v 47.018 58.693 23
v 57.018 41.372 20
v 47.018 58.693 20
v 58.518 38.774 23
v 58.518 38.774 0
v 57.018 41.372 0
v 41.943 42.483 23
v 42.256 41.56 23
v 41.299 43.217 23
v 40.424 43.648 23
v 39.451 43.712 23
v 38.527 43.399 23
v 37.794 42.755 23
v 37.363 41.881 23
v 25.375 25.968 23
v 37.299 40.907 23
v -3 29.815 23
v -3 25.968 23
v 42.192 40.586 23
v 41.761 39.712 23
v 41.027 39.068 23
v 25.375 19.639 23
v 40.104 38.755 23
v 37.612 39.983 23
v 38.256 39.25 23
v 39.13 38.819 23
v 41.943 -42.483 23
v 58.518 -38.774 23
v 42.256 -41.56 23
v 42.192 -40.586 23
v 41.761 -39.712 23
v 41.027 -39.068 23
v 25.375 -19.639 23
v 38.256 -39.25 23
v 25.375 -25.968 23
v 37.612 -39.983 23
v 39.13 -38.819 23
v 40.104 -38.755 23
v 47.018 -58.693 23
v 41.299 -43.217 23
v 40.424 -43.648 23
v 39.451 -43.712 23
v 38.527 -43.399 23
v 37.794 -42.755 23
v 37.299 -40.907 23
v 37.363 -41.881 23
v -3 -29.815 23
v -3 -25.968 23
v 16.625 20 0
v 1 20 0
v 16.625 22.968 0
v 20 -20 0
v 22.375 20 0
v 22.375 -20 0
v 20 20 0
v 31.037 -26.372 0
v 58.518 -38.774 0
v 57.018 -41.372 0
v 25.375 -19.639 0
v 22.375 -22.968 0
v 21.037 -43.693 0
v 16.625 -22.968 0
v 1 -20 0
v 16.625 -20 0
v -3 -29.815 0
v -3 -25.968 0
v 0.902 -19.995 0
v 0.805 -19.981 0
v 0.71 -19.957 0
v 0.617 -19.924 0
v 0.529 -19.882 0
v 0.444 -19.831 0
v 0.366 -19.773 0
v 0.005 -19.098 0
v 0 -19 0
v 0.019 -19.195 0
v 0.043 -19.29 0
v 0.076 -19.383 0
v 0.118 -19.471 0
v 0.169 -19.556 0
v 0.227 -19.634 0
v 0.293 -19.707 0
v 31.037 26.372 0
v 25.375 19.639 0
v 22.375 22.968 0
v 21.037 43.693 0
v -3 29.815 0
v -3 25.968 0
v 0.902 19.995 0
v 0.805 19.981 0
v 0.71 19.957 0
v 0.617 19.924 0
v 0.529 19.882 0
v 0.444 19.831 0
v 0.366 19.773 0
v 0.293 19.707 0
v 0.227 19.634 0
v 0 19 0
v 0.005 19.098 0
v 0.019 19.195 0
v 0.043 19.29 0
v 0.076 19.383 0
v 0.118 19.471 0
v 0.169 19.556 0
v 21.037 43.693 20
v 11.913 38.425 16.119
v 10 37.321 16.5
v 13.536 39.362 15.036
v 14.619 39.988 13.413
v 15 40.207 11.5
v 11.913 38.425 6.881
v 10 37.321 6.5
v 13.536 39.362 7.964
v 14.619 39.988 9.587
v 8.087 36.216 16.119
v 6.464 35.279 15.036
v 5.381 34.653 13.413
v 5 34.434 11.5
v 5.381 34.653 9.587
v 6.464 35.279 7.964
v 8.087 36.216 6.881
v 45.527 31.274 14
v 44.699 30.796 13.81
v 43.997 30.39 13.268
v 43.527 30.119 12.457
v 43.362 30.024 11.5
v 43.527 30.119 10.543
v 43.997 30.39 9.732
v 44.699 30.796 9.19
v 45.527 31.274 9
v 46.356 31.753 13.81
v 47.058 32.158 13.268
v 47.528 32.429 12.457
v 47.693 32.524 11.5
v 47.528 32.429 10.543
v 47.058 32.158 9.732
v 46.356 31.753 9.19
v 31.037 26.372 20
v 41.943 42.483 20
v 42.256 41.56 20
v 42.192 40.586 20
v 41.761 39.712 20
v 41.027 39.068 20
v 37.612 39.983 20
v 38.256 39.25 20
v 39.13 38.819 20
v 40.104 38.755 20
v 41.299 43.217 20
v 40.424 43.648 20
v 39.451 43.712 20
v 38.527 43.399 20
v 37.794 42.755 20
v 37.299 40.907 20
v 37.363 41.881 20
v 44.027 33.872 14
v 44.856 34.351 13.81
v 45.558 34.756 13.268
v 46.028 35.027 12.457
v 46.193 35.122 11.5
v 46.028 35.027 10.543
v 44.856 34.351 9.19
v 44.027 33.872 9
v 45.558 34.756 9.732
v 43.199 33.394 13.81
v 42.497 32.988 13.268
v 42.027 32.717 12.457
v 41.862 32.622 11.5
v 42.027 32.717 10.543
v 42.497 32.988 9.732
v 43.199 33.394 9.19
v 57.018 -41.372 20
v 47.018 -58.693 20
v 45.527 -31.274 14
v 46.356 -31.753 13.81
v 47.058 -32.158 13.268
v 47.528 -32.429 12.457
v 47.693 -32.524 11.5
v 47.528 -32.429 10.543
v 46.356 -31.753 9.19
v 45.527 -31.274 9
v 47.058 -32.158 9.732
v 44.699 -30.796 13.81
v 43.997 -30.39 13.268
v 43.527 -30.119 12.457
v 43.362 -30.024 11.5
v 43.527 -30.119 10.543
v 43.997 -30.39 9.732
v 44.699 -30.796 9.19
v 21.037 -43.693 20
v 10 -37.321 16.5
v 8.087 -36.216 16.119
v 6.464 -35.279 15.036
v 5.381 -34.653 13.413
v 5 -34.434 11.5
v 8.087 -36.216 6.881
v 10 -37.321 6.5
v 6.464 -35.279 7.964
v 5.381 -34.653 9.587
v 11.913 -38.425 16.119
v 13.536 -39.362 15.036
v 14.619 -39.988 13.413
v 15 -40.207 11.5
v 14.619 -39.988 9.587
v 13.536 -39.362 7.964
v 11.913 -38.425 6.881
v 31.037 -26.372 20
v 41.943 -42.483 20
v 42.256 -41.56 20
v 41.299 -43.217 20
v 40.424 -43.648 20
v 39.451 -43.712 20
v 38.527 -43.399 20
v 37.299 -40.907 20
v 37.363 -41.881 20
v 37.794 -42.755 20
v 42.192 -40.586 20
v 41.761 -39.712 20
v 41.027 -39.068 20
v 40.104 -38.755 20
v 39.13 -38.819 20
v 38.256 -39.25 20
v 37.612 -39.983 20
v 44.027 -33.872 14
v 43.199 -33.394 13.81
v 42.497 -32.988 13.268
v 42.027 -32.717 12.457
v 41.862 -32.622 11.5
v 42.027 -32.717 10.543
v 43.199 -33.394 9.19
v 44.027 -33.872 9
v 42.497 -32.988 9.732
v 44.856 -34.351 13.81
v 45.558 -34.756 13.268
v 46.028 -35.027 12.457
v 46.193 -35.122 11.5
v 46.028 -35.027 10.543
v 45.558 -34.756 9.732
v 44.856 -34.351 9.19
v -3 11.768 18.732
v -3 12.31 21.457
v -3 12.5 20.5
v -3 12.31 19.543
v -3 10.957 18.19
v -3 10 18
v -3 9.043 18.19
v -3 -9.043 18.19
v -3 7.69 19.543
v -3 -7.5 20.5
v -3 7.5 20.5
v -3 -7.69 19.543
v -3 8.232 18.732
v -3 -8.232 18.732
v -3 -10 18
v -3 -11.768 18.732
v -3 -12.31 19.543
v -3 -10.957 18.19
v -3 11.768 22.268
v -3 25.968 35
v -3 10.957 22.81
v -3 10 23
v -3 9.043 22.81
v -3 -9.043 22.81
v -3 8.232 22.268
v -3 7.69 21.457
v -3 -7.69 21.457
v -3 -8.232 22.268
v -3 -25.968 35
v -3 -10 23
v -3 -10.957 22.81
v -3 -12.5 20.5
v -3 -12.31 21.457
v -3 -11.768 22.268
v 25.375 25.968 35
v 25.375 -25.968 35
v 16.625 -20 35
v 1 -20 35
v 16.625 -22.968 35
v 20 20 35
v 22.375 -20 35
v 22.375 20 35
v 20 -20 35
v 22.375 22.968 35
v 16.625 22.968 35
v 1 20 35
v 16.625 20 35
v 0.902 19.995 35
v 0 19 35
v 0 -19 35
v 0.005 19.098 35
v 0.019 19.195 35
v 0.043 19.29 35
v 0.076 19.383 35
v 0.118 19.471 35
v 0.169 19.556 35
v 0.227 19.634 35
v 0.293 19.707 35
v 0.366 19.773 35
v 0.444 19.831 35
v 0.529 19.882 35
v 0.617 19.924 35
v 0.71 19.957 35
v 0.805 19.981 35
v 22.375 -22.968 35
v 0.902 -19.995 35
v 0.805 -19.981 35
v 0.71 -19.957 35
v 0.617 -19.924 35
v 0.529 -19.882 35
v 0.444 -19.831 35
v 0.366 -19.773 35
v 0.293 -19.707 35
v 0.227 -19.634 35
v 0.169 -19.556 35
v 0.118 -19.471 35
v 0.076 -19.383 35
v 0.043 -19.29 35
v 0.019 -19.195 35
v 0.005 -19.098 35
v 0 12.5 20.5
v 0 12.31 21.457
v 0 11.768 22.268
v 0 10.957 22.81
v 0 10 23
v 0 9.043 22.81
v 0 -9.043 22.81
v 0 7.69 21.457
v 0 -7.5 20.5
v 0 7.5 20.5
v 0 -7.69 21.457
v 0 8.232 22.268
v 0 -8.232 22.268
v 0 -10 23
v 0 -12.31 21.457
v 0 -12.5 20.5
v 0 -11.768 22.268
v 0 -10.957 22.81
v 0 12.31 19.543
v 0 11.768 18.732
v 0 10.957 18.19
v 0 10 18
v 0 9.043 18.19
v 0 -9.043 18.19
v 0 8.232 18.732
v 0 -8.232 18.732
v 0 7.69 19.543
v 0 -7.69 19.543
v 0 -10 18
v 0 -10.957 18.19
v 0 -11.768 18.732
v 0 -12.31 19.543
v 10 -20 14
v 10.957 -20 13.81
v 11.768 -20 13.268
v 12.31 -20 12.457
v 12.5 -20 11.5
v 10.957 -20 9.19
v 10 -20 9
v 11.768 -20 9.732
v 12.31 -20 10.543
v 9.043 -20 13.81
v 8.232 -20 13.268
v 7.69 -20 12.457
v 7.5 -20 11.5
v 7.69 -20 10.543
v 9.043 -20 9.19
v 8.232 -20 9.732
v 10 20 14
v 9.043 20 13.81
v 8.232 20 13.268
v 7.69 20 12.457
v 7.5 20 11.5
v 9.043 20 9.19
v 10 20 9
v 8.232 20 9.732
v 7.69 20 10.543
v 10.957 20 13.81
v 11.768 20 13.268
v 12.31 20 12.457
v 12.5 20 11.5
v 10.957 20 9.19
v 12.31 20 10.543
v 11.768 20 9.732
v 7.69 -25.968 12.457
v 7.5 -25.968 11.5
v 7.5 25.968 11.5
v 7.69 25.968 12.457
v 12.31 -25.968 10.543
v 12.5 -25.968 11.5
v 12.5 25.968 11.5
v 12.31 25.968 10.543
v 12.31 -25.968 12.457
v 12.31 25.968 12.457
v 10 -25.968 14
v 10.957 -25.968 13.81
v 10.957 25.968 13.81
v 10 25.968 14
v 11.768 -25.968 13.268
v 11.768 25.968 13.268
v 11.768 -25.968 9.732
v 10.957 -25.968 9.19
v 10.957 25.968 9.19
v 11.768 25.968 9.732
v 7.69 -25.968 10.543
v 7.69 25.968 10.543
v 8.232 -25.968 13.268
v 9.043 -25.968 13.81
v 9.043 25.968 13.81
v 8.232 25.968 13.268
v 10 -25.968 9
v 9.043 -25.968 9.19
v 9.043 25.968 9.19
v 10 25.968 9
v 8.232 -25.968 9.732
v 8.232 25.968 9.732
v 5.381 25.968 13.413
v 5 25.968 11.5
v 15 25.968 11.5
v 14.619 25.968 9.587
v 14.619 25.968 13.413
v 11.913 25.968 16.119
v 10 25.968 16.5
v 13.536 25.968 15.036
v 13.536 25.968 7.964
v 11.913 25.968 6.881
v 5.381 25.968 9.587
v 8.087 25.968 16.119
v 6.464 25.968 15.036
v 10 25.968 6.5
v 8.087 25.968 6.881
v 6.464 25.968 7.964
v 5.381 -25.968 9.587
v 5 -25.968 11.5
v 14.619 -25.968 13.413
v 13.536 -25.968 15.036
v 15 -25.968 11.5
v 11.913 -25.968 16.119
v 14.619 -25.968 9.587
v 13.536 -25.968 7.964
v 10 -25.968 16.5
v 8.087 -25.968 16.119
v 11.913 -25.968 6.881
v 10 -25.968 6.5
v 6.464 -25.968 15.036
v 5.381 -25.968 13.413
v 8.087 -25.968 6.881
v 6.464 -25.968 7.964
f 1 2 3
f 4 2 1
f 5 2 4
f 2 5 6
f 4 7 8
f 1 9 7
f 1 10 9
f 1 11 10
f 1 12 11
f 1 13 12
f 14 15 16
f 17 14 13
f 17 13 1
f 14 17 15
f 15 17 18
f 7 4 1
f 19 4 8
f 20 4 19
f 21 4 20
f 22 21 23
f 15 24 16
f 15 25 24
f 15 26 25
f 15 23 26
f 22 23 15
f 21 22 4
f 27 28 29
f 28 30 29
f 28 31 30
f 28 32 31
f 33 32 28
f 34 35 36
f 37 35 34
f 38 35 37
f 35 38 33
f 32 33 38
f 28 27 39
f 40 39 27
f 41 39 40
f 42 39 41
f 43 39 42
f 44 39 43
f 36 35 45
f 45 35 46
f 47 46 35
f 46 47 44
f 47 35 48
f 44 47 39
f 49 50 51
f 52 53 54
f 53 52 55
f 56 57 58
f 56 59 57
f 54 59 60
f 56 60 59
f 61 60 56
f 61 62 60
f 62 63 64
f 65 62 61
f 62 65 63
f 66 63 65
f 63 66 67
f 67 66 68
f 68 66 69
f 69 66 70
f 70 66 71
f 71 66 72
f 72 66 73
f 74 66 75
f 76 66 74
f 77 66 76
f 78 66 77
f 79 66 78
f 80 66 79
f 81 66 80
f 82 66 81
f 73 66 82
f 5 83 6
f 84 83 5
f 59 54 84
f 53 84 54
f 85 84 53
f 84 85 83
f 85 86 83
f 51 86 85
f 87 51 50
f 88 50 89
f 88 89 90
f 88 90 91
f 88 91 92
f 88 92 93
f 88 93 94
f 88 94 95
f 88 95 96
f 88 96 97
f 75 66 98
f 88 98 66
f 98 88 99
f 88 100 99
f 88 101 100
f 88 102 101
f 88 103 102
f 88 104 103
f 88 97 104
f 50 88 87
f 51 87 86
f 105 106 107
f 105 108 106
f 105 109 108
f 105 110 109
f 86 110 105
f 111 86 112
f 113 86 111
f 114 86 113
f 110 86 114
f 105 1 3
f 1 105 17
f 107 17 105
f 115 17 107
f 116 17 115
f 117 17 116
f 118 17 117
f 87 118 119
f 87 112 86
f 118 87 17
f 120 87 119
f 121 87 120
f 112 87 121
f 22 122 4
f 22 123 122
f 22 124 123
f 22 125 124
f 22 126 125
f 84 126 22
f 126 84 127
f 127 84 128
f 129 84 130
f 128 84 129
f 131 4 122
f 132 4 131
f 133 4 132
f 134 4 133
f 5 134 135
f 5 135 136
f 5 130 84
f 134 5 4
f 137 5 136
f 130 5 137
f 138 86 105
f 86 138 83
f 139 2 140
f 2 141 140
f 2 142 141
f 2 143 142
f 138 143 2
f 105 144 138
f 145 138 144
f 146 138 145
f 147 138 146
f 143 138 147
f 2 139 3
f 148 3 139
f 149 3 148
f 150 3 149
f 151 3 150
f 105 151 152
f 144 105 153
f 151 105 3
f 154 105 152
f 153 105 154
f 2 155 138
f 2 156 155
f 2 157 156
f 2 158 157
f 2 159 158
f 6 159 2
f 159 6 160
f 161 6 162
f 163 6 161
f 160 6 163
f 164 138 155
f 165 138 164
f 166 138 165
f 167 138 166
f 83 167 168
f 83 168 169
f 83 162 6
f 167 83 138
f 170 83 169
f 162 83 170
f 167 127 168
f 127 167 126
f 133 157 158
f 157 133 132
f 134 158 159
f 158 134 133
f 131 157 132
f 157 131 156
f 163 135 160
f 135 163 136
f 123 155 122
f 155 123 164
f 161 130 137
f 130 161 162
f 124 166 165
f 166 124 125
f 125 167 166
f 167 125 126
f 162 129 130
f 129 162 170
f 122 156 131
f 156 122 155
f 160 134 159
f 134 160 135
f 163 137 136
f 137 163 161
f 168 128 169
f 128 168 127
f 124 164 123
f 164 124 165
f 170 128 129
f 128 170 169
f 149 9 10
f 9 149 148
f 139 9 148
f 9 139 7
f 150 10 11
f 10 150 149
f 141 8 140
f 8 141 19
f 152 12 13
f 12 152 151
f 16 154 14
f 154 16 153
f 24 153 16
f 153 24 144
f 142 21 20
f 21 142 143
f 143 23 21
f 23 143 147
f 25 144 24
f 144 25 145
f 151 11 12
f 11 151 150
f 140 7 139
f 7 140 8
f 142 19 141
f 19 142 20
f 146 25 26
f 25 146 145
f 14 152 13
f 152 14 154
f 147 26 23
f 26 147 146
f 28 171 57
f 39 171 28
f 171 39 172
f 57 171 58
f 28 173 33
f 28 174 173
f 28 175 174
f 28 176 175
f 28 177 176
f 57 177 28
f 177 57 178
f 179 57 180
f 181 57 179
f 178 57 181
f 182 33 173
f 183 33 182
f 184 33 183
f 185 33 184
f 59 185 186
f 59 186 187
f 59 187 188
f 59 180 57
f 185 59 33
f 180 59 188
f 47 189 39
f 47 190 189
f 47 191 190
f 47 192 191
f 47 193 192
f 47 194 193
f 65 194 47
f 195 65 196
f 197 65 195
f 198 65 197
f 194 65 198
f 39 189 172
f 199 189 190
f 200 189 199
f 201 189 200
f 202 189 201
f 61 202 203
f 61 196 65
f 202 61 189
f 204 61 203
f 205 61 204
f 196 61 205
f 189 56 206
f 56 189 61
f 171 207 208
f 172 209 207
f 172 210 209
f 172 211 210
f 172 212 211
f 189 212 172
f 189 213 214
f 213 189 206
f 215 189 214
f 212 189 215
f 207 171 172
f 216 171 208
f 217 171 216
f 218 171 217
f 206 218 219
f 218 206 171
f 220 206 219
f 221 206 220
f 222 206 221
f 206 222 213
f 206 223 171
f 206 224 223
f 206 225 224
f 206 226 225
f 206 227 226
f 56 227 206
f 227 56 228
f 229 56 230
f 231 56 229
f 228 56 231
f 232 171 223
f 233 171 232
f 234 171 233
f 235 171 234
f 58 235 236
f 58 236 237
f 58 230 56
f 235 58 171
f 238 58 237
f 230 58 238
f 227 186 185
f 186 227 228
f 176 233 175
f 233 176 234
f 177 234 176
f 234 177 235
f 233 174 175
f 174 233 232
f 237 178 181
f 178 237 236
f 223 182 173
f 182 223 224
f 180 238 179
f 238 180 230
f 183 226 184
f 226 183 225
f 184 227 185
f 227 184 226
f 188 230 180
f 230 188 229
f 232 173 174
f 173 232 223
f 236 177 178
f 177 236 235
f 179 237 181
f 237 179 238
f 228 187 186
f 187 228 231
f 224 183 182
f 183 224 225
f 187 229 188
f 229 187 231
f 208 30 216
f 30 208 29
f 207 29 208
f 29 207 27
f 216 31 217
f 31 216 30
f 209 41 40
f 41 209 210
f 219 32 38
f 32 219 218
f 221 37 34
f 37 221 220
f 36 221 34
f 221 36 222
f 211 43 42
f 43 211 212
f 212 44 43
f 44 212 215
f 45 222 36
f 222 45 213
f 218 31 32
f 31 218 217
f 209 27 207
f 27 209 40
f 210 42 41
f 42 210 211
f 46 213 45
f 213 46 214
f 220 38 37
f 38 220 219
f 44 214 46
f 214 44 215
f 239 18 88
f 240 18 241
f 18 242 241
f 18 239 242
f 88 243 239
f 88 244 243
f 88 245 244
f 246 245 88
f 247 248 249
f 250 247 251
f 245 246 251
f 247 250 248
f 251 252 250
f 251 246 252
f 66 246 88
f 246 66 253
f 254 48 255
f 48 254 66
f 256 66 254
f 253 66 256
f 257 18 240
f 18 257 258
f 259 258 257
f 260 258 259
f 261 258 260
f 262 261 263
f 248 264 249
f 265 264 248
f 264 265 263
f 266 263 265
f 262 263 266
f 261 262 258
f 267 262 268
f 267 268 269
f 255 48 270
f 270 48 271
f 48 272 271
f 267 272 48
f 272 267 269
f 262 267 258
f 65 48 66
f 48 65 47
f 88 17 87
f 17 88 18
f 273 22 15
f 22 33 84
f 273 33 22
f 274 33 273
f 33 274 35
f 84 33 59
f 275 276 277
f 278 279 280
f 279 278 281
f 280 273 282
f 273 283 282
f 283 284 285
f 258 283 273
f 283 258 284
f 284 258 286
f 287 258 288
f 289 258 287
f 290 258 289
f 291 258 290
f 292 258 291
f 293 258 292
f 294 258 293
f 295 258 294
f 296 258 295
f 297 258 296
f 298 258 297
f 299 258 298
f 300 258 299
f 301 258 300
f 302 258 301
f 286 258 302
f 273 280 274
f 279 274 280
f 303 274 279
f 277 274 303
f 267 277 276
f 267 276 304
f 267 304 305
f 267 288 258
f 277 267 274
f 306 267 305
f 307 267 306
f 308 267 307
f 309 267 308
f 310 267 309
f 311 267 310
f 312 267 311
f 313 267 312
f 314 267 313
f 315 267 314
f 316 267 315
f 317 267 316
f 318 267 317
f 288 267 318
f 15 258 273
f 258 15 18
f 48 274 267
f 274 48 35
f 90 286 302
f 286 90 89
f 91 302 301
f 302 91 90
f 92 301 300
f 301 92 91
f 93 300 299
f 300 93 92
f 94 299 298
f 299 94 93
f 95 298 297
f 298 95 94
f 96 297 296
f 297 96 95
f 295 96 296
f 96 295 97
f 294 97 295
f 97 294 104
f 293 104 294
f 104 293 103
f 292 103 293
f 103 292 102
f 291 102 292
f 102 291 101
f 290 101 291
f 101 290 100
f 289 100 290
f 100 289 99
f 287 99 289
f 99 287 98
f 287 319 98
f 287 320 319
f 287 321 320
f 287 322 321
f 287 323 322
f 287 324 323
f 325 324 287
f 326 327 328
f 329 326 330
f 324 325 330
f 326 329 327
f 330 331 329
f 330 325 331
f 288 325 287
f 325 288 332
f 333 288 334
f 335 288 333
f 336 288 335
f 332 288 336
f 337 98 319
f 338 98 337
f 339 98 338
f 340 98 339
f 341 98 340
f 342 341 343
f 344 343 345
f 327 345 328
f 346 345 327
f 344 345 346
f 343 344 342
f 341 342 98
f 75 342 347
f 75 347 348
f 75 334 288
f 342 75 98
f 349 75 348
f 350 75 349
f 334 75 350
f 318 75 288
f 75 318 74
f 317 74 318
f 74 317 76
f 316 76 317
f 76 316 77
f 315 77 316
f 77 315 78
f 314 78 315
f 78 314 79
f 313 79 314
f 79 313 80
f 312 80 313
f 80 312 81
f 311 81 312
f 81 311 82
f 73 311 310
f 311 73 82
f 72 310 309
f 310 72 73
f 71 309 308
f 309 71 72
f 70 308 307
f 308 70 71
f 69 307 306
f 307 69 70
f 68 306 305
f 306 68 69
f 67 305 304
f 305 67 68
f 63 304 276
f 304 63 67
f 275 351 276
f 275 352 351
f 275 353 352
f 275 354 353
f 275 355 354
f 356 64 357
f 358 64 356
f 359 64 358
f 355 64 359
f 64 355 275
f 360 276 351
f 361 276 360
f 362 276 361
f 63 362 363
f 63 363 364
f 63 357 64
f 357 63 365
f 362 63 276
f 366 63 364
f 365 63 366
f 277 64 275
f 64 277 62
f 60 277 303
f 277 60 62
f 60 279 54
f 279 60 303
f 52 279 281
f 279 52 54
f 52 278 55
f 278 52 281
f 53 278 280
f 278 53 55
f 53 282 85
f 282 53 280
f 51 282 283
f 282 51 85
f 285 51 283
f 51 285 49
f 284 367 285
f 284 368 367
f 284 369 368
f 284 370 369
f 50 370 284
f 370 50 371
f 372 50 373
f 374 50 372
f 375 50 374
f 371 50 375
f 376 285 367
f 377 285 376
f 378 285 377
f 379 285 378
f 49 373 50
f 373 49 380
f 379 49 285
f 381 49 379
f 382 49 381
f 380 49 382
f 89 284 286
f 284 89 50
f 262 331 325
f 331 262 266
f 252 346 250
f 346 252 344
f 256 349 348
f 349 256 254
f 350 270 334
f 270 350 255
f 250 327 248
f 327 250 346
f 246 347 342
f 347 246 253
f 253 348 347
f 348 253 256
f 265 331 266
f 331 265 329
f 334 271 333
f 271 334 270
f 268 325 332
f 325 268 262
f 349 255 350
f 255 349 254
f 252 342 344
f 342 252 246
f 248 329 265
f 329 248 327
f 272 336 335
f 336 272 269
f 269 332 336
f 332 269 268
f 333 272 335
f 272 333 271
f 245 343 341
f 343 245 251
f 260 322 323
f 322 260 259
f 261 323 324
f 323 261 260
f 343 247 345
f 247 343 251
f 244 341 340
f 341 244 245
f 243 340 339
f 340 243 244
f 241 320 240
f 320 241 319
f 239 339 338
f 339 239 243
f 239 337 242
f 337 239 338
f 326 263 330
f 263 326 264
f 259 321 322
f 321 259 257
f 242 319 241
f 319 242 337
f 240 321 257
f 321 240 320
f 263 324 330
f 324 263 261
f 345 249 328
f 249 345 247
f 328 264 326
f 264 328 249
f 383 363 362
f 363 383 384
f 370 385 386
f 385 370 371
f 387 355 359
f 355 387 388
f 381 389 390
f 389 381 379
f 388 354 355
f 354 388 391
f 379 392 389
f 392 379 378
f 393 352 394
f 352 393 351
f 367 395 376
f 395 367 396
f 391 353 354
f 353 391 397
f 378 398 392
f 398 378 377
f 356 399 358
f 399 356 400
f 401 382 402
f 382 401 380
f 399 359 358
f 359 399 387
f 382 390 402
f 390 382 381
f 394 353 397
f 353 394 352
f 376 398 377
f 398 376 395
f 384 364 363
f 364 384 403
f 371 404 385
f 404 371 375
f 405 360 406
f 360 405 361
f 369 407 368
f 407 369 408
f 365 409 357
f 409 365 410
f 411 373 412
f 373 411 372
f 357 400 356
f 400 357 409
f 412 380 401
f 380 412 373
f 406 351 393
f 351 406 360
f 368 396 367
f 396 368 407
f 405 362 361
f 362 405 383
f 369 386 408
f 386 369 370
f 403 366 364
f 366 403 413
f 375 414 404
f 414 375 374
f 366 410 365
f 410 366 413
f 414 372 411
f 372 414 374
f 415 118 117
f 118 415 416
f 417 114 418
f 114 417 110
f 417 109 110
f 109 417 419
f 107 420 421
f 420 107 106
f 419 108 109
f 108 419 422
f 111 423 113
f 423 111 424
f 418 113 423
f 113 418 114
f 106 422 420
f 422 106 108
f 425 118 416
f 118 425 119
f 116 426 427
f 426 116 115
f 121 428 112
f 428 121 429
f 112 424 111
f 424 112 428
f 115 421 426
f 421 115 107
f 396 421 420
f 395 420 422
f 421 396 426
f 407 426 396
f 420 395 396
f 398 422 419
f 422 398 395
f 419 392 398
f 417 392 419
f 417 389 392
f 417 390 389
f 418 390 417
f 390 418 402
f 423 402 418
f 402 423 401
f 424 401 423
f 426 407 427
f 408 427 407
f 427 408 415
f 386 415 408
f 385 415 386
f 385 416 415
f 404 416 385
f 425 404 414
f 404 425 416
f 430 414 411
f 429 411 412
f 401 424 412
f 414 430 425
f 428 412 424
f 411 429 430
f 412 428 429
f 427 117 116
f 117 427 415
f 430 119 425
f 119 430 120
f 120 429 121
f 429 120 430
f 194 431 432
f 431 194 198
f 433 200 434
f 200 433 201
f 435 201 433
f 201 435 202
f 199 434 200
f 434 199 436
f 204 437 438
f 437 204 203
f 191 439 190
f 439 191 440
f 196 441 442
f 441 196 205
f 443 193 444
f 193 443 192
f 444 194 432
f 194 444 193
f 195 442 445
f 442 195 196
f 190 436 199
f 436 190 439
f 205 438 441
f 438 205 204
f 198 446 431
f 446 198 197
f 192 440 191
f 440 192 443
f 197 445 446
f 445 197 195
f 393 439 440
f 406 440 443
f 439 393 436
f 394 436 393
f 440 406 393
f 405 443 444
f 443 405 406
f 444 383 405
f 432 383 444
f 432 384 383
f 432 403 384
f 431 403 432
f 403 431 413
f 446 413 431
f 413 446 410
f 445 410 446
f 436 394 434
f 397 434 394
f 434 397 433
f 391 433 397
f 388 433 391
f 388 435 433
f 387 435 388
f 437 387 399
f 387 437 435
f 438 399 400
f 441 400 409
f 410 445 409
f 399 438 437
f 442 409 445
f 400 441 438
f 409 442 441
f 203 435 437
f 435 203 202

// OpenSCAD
// file: ../../conf/printer_config.scad
/**********************************************************************************************************************
 **
 ** conf/printer_config.scad
 **
 ** This file contains the main control variables that determine the size and shape of the printer. Note that in the
 ** actual parts specifications, the constants defined here will only ever be accessed through functions defined in
 ** conf/derived_sizes.scad exclusively to allow for easier adaptation, should the mode of calculation change. 
 **
 ** All sizes in mm. Caution: Little to no cross-checking is implemented. Change values sensibly and one at a time.
 **
 ** This file is NOT to be included by any other file except for conf/derived_sizes.scad.
 **
 **********************************************************************************************************************/

// ===== PRINTER CONFIGURATION ========================================================================================

// The length of the vertical MakerSlide extrusions that make up the rails for the carriages.
FRAME_V_RAIL_HEIGHT = 800;

// The length of the horizontal 20x20 V-Slot extrusions that form the sides of the triangle.
FRAME_H_RAIL_LENGTH = 400;

// ===== FABRICATED PART DIMENSIONS ===================================================================================

// The thickness of the walls outside the extruded parts.
FRAME_PART_WALL_THICKNESS = 3;

// The thickness of the wall that separates the vertical rails from the horizontal extrusions.
FRAME_V_H_RAIL_SEPARATION = 8;

// The depth of the holes that hold the V-Slot extrusions.
FRAME_PART_VSLOT_DEPTH = 30;

// The depth of the holes that hold the MakerSlide extrusions.
FRAME_PART_HSLOT_DEPTH = 35;

// The height of the bracket that holds the motor. WARNING: Increasing this might make it difficult to 
// turn the screws that hold the motor.
FRAME_PART_BRACKET_HEIGHT = 25;

// // ===== SCREWS, NUTS, BOLTS AND OTHER HARDWARE =======================================================================

// The diameter of the screws used to assemble the frame.
FRAME_SCREW_SIZE = 5;

// The diameter of the head of the screws used to assemble the frame. Actually, this is the size of the inset flange.
// The screw head of a M5 hex screw is 8.5 mm in diameter, so 10 mm should leave enough clearance.
FRAME_SCREW_HEAD_SIZE = 10;
// file: ../extrusions/vslot_2020.scad
/**********************************************************************************************************************
 **
 ** parts/extrusions/vslot_2020.scad
 **
 ** This file ontains some general functions that provide the dimensions of the profile as well as the modules used 
 ** to import the rendered rails. 
 ** This file is intended to be included by other files down the line.
 **
 **********************************************************************************************************************/

use <../../bom/bom.scad>
use <../../conf/colors.scad>
use <../../conf/derived_sizes.scad>
use <../../conf/part_sizes.scad>

/**
 * Provides the pre-rendered horizontal side piece.
 * The extrusion will lie horizontally along the positive X axis and will extend into positve Y and Z.
 */
module vslot_2020_side() {
	bom_entry(description = "V-Slot Extrusion", size = str(horizontal_extrusion_length(), "x20x20 mm"));
	color_extrusion()
		import(file = "vslot_2020_side.stl"); 
}

/**
 * Create an object that resembles the outer shell of a V-Slot 20x20 mm extrusion. Usage is similar
 * to vslot_extrusion(length). This is handy to punch a hole into a printed part that will later
 * accomodate the V-Slot 20x20 mm extrusion.
 */
module vslot_2020_punch(length, rounded = false) {
	color_punch()
		linear_extrude(height = length, center = false, convexity = 10)
			if (rounded) {
				hull($fn = vslot_2020_edge_resolution()) {
					translate([vslot_2020_edge_radius(), vslot_2020_edge_radius(), 0])
						circle(r = vslot_2020_edge_radius());
					translate([vslot_2020_depth() - vslot_2020_edge_radius(), vslot_2020_edge_radius(), 0])
						circle(r = vslot_2020_edge_radius());
					translate([vslot_2020_edge_radius(), 18.5, 0])
						circle(r = vslot_2020_edge_radius());
					translate([vslot_2020_depth() - vslot_2020_edge_radius(), vslot_2020_width() - vslot_2020_edge_radius(), 0])
						circle(r = vslot_2020_edge_radius());
				}
			} else {
				square([vslot_2020_depth(), vslot_2020_width()]);
			}
}
// file: ../extrusions/makerslide.scad
/**********************************************************************************************************************
 **
 ** parts/extrusions/makerslide.scad
 **
 ** This file ontains some general functions that provide the dimensions of the profile as well as the modules used 
 ** to import the rendered rails. 
 ** This file is intended to be included by other files down the line.
 **
 **********************************************************************************************************************/

use <../../bom/bom.scad>
use <../../conf/colors.scad>
use <../../conf/derived_sizes.scad>
use <../../conf/part_sizes.scad>

/**
 * Provides the pre-rendered main vertical rail.
 * The extrusion will reach into positive X and Z space while being centered on the Y axis.
 */
module makerslide_vertical_rail() {
	bom_entry(description = "MakerSlide Extrusion", size = str(vertical_extrusion_length(), " mm"));
	color_extrusion()
		import(file = "makerslide_rail.stl"); 
}

/**
 * Create an object that resembles the outer shell of a MakerSlide extrusion. Usage is similar
 * to makerslide_vertical_rail(length). This is handy to punch a hole into a printed part that will later
 * accomodate the MakerSlide extrusion.
 */
module makerslide_punch(length) {
	color_punch()
		linear_extrude(height = length, center = false, convexity = 10)
			union() {
				hull() {
					// use two circles for the back sides
					_y_offset = makerslide_base_width()/2 - makerslide_edge_radius();
					translate([makerslide_edge_radius(), -_y_offset, 0])
						circle(r = makerslide_edge_radius(), $fn = makerslide_edge_resolution());
					translate([makerslide_edge_radius(), _y_offset, 0])
						circle(r = makerslide_edge_radius(), $fn = makerslide_edge_resolution());
					// use a rectangle to shape the front side
					translate([makerslide_base_depth() - 1, -makerslide_base_width()/2, 0])
						square([1, makerslide_base_width()]);
				}
				_rail_base_x = makerslide_base_depth() - makerslide_edge_radius() - makerslide_rail_depth();
				_rail_offset_y = makerslide_base_width()/2;
				_rail_punch_width = makerslide_rail_width();
				_rail_punch_depth = 2*makerslide_rail_depth() + makerslide_edge_radius();
				translate([_rail_base_x, -_rail_offset_y - _rail_punch_width, 0])
					square([_rail_punch_depth, _rail_punch_width]);
				translate([_rail_base_x, _rail_offset_y, 0])
					square([_rail_punch_depth, _rail_punch_width]);

				// previous version:
				// // use the profile itself as the basic shape
				// import(file = "makerslide.dxf"); 
				// // add a rectangle to fill the holes on the left/right (small) sides 
				// // as well as most of the inside of the profile
				// translate([2, -20, 0])
				// 	square([18, 40]);
				// // add a second rectangle to fill the gaps on the back (we want to keep the rounded edges)
				// translate([0, -18, 0])
				// 	square([2, 36]);
				
			}
}
// file: ../../conf/part_sizes.scad
/**********************************************************************************************************************
 **
 ** conf/part_sizes.scad
 **
 ** This file contains functions that provide fixed sizes of external standard parts. Normally, these values
 ** would have been kept with the individual parts, but that would result in a recursive dependency.
 **
 **********************************************************************************************************************/

// ----- parts/extrusions/vslot_2020.scad ------------------------------------------------------------------------------

// The dimensions were taken from the file vslot_2020_dimensions.jpg.

/**
 * Return the depth (X size) and width (Y size) of the V-Slot extrusion.
 */
function vslot_2020_depth() = 20;
function vslot_2020_width() = 20;

/**
 * The edge radius of the back side and the resolution used to render the curve.
 */
function vslot_2020_edge_radius() = 1.5;
function vslot_2020_edge_resolution() = 64;

/**
 * Return the offset of the screw/nut slots from the back edges or the center.
 */
function vslot_2020_slot_offset() = 10;

// ----- parts/extrusions/makerslide.scad ------------------------------------------------------------------------------

// All dimensions were taken from the file makerslide_b17022_rev_2.pdf.

/**
 * Return the depth (X size) and width (Y size) of the base of the MakerSlide extrusion. These measurements exclude the 
 * rail extensions on the front side, i. e. only comprise the rectangular main body.
 */
function makerslide_base_depth() = 20;
function makerslide_base_width() = 40;

/**
 * Return the additional depth (X size) and width (Y size) introduced by the rail extensions. Note that the width
 * specified here comprises a single rail only.
 */
function makerslide_rail_depth() = 4.75/2;
function makerslide_rail_width() = 5.9358/2;

/**
 * Return the depth (X size) and width (Y size) of the MakerSlide extrusion. These measurements comprise the 
 * rail extensions on the front side.
 */
function makerslide_depth() = makerslide_base_depth() + makerslide_rail_depth();
function makerslide_width() = makerslide_base_width() + 2*makerslide_rail_width();

/**
 * The distance from the "back center" (the origin) of the MakerSlide vertical rails to the outer edges of the rail.
 * Measured value from the DXF drawings: 30.52933453 mm.
 * Calculated size: 32.065 mm
 * The difference is probably due to a rounded edge in the drawing.
 */
function makerslide_rail_edge_distance() = sqrt(pow(makerslide_width() / 2, 2) + pow(makerslide_depth(), 2));

/**
 * The edge radius of the back side and the resolution used to render the curve.
 */
function makerslide_edge_radius() = 1;
function makerslide_edge_resolution() = 64;

/**
 * Return the offset of the screw/nut slots from the back edges or the center.
 */
function makerslide_slot_offset() = 10;
// file: ../../conf/derived_sizes.scad
/**********************************************************************************************************************
 **
 ** conf/derived_sizes.scad
 **
 ** This file contains functions that calculate various dimensions of the printer. Note that sizes that are only 
 ** relevant for specific parts are calculated in the corresponding part files directly.
 **
 **********************************************************************************************************************/

include <printer_config.scad>
use <part_sizes.scad>

// ===== PRINTER FRAME SIZES ===========================================================================================

/**
 * The length of the vertical MakerSlide extrusions.
 */
function vertical_extrusion_length() = FRAME_V_RAIL_HEIGHT;

/**
 * The length of the horizontal 20x20 V-Slot extrusions.
 */
function horizontal_extrusion_length() = FRAME_H_RAIL_LENGTH;

/**
 * The offset of the horizontal V-Slot extrusions from the logical crossing point of the sides of the center triangle
 * (that is, from the center of the outer side of the MakerSlide rail).
 */
function horizontal_extrusion_offset() = makerslide_rail_edge_distance() + horizontal_vertical_extrusion_gap();

/**
 * The overall size of the base triangle - from one crossing point to the next.
 */
function horizontal_base_length() = horizontal_extrusion_length() + 2 * horizontal_extrusion_offset();

// ===== FABRICATED PART DIMENSIONS ===================================================================================

/**
 * The thickness of the wall that separates the vertical rails from the horizontal extrusions.
 */
function horizontal_vertical_extrusion_gap() = FRAME_V_H_RAIL_SEPARATION;

/**
 * The overall thickness of the walls adjacent to the metal extrusions.
 */
function frame_wall_thickness() = FRAME_PART_WALL_THICKNESS;

/**
 * The depth of the holes that hold the V-Slot extrusions.
 */
function horizontal_recess_depth() = FRAME_PART_VSLOT_DEPTH;

/**
 * The distance from the outer perimeter of the screw holes that hold the V-Slot extrusions.
 */
function horizontal_screw_distance() = FRAME_PART_VSLOT_DEPTH/2;

/**
 * The depth of the holes that hold the V-Slot extrusions.
 */
function vertical_recess_depth() = FRAME_PART_HSLOT_DEPTH;

/**
 * The height of the bracket that holds the motor (only of the part that holds the rail).
 */
function motor_bracket_height() = FRAME_PART_BRACKET_HEIGHT;

// ===== SCREWS, NUTS, BOLTS AND OTHER HARDWARE =======================================================================

/**
 * The diameter of the screws used to assemble the frame.
 */
function frame_screw_size() = FRAME_SCREW_SIZE;

/**
 * The diameter of the heads of the screws used to assemble the frame.
 */
function frame_screw_head_size() = FRAME_SCREW_HEAD_SIZE;

/**
 * The rendering resolution of the screw holes. Not configurable at the moment.
 */
function frame_screw_hole_resolution() = 16;

// ===== PART PLACEMENT ================================================================================================

/**
 * The offset of the front plane from the X origin into positive X. This offset is applied to the back center of the
 * vertical rails, thus marking the front side of the construction triangle between the origins of the vertical rails.
 */
function front_plane_offset() = sqrt(pow(horizontal_base_length(), 2) - pow(horizontal_base_length() / 2, 2));

/**
 * The positions of the vertical rails. A is the "front left" rail, B the "front right" rail, C the back rail.
 */
function position_rail_a() = [front_plane_offset(), -horizontal_base_length() / 2, 0];
function position_rail_b() = [front_plane_offset(),  horizontal_base_length() / 2, 0];
function position_rail_c() = [0, 0, 0];

/**
 * Each of the horizontal extrusion sets is placed outside of the construction triangle. This function specifies the
 * distance by which the rails are offset.
 */
function horizontal_extrusion_outward_offset() = (makerslide_base_width()/2 * sin(60)) - (vslot_2020_width()/2);

/**
 * The positions of the horizontal side assemblies. Be aware that - in contrast to the positioning of the vertical 
 * rails - the translation is applied BEFORE the rotation since that makes the calculation much easier to understand.
 */
function position_front_assembly() = [front_plane_offset() + horizontal_extrusion_outward_offset(), 
                                      -horizontal_extrusion_length()/2, 0];
function position_left_assembly() = [-horizontal_extrusion_outward_offset() - vslot_2020_depth(),
                                     -horizontal_extrusion_length() - horizontal_extrusion_offset(), 0];
function position_right_assembly() = [-horizontal_extrusion_outward_offset() - vslot_2020_depth(),
                                      horizontal_extrusion_offset(), 0];
// file: ../../conf/colors.scad
/**********************************************************************************************************************
 **
 ** conf/colors.scad
 **
 ** This file defines some modules to use symbolic colors throughout the entire project.
 **
 **********************************************************************************************************************/

/**
 * The color of the aluminium extrusions.
 */
module color_extrusion() {
	color("LightGrey")
		children();
} 

/**
 * The color of the "outer" printed frame elements.
 */
module color_printed_outer_frame() {
	color("RoyalBlue")
		children();
} 

/**
 * The color of punches and other objects that are usually not intended to be rendered as such, but rather to be
 * used as subtractive objects.
 */
module color_punch() {
	color("Red")
		children();
} 
// file: ../../bom/bom.scad
/**********************************************************************************************************************
 **
 ** bom/bom.scad
 **
 ** This file provides the functions to generate a basic bill of materials (BOM) from the model.
 **
 **********************************************************************************************************************/

/**
 * A recursive function to format the parent module hierarchy as a series of delimited sub-strings.
 * Example: "vertical_axis_assembly>_vertical_axis_assembly>makerslide_vertical_rail"
 */
function _bom_parent_list(level, delimiter = ">") = 
	(level < $parent_modules - 1) ? str(_bom_parent_list(level = level + 1), delimiter, parent_module(level)) : "";

module bom_entry(description = "", size = "", number = 1) {
	// Only perform any actions if WRITE_BOM is set. This is done through the command line - see Makefile.
	if (WRITE_BOM) {
		echo(str("BOM;", description, ";", size, ";", number, ";", _bom_parent_list(level = 2)));
	}
}
// main file
/**********************************************************************************************************************
 **
 ** parts/foot.scad
 **
 ** This file constructs the lower foot of the printer frame. To assemble the printer, you need three of these parts.
 **
 **********************************************************************************************************************/

use <../../bom/bom.scad>
use <../../conf/colors.scad>
use <../../conf/derived_sizes.scad>
use <../../conf/part_sizes.scad>
use <../../parts/extrusions/makerslide.scad>
use <../../parts/extrusions/vslot_2020.scad>

// The dimensions of the horizontal parts that hold the V-Slot extrusions.
function _foot_horizontal_height() = vslot_2020_depth() + frame_wall_thickness();
function _foot_horizontal_width()  = vslot_2020_width() + frame_wall_thickness();
function _foot_horizontal_depth()  = horizontal_extrusion_offset() + horizontal_recess_depth();

// The dimensions of the vertical part that holds the MakerSlide extrusion.
function _foot_vertical_height() = vertical_recess_depth();
function _foot_vertical_width()  = frame_wall_thickness() + makerslide_width() + frame_wall_thickness();
function _foot_vertical_depth()  = frame_wall_thickness() + makerslide_depth() + frame_wall_thickness();

// TODO add some holes to screw the foot to a flat surface
// TODO add the possibility to add a variable foot for height adjustment / leveling

/**
 * Auxiliary module that creates one of the vertical legs. Not to be used outside of this file.
 */
module _foot_horizontal_leg(right = false) { 
	difference() {
		// the basic shape of the leg
		cube([_foot_horizontal_depth(), _foot_horizontal_width(), _foot_horizontal_height()]);
		// minus the recess for the horizontal extrusion
		translate([horizontal_extrusion_offset(), right ? 0 : frame_wall_thickness(), vslot_2020_depth()])
			rotate([0, 90, 0])
				vslot_2020_punch(horizontal_recess_depth());
		// minus the screw hole on the inside
		_screw_x = _foot_horizontal_depth()-horizontal_screw_distance();
		translate([_screw_x, _foot_horizontal_width()/2, _foot_horizontal_height()/2])
			rotate([90, 0, 0])
				cylinder(d = frame_screw_size(), h = _foot_horizontal_width(), 
		                 center = true, $fn = frame_screw_hole_resolution());
		// minus the screw hole on the top side
		translate([_screw_x, _foot_horizontal_width()/2, _foot_horizontal_height() - frame_wall_thickness()])
				cylinder(d = frame_screw_size(), h = 2*frame_wall_thickness(), 
		                 center = true, $fn = frame_screw_hole_resolution());
	}
}

/**
 * Creates the lower foot assembly by rendering it from scratch. This module is not to be called externally, use 
 * foot() instead.
 */
module _render_foot() {
	color_printed_outer_frame()
		render() {
			difference() {
				union() {
					// add a block to hold the MakerSlide extrusion, but without the holes for now
					translate([-frame_wall_thickness(), -_foot_vertical_width()/2, 0])
						cube([_foot_vertical_depth(), _foot_vertical_width(), _foot_vertical_height()]);
					// add blocks to hold the V-Slot extrusions, restricted to the specified wall depth in negative Y
					difference() {
						union() {
							rotate([0, 0, 30])
								translate([0, 
									-frame_wall_thickness() + horizontal_extrusion_outward_offset(), 0])
									_foot_horizontal_leg(right = false);
							rotate([0, 0, -30])
								translate([0, 
									-_foot_horizontal_width() - horizontal_extrusion_outward_offset() + frame_wall_thickness(), 0])
									_foot_horizontal_leg(right = true);
						}
						translate([-vslot_2020_depth()-frame_wall_thickness(), -makerslide_width(), 0])
							cube([vslot_2020_depth(), 2*makerslide_width(), _foot_horizontal_height()]);
					}
				}
				// minus the hole for the MakerSlide extrusion
				makerslide_punch(vertical_recess_depth());
				// minus the screw holes on the back
				_back_screw_z = frame_wall_thickness() + vertical_recess_depth()/2;
				translate([-frame_wall_thickness()/2, -makerslide_slot_offset(), _back_screw_z])
					rotate([0, 90, 0])
						cylinder(d = frame_screw_size(), h = 2*frame_wall_thickness(), 
								 center = true, $fn = frame_screw_hole_resolution());
				translate([-frame_wall_thickness()/2, makerslide_slot_offset(), _back_screw_z])
					rotate([0, 90, 0])
						cylinder(d = frame_screw_size(), h = 2*frame_wall_thickness(), 
								 center = true, $fn = frame_screw_hole_resolution());
				// minus the screw holes on the side
				_side_screw_z = _foot_horizontal_height()/2; // align with other screw
				translate([makerslide_slot_offset(), 0, _side_screw_z])
					rotate([90, 0, 0])
						cylinder(d = frame_screw_size(), h = 2*_foot_vertical_width(), 
								 center = true, $fn = frame_screw_hole_resolution());
				// minus an additional inset so that the side screws can rest on a perpendicular surface
				_inset_depth = 100;
				translate([makerslide_slot_offset(), _foot_vertical_width()/2 + _inset_depth/2, _side_screw_z])
					rotate([90, 0, 0])
						cylinder(d = frame_screw_head_size(), h = _inset_depth, 
								 center = true, $fn = frame_screw_hole_resolution());
				translate([makerslide_slot_offset(), -_foot_vertical_width()/2 - _inset_depth/2, _side_screw_z])
					rotate([90, 0, 0])
						cylinder(d = frame_screw_head_size(), h = _inset_depth, 
								 center = true, $fn = frame_screw_hole_resolution());				
			}
		} 
}

/**
 * Main module to use the pre-rendered lower foot. The assembly is centered on the Z axis in Y direction for easier 
 * manipulation, similar to the MakerSlide extrusion. 
 */
module foot() {
	bom_entry(description = "Printed Frame Parts", size = "Foot");
	color_printed_outer_frame()
		import(file = "foot.stl");
}

_render_foot();
